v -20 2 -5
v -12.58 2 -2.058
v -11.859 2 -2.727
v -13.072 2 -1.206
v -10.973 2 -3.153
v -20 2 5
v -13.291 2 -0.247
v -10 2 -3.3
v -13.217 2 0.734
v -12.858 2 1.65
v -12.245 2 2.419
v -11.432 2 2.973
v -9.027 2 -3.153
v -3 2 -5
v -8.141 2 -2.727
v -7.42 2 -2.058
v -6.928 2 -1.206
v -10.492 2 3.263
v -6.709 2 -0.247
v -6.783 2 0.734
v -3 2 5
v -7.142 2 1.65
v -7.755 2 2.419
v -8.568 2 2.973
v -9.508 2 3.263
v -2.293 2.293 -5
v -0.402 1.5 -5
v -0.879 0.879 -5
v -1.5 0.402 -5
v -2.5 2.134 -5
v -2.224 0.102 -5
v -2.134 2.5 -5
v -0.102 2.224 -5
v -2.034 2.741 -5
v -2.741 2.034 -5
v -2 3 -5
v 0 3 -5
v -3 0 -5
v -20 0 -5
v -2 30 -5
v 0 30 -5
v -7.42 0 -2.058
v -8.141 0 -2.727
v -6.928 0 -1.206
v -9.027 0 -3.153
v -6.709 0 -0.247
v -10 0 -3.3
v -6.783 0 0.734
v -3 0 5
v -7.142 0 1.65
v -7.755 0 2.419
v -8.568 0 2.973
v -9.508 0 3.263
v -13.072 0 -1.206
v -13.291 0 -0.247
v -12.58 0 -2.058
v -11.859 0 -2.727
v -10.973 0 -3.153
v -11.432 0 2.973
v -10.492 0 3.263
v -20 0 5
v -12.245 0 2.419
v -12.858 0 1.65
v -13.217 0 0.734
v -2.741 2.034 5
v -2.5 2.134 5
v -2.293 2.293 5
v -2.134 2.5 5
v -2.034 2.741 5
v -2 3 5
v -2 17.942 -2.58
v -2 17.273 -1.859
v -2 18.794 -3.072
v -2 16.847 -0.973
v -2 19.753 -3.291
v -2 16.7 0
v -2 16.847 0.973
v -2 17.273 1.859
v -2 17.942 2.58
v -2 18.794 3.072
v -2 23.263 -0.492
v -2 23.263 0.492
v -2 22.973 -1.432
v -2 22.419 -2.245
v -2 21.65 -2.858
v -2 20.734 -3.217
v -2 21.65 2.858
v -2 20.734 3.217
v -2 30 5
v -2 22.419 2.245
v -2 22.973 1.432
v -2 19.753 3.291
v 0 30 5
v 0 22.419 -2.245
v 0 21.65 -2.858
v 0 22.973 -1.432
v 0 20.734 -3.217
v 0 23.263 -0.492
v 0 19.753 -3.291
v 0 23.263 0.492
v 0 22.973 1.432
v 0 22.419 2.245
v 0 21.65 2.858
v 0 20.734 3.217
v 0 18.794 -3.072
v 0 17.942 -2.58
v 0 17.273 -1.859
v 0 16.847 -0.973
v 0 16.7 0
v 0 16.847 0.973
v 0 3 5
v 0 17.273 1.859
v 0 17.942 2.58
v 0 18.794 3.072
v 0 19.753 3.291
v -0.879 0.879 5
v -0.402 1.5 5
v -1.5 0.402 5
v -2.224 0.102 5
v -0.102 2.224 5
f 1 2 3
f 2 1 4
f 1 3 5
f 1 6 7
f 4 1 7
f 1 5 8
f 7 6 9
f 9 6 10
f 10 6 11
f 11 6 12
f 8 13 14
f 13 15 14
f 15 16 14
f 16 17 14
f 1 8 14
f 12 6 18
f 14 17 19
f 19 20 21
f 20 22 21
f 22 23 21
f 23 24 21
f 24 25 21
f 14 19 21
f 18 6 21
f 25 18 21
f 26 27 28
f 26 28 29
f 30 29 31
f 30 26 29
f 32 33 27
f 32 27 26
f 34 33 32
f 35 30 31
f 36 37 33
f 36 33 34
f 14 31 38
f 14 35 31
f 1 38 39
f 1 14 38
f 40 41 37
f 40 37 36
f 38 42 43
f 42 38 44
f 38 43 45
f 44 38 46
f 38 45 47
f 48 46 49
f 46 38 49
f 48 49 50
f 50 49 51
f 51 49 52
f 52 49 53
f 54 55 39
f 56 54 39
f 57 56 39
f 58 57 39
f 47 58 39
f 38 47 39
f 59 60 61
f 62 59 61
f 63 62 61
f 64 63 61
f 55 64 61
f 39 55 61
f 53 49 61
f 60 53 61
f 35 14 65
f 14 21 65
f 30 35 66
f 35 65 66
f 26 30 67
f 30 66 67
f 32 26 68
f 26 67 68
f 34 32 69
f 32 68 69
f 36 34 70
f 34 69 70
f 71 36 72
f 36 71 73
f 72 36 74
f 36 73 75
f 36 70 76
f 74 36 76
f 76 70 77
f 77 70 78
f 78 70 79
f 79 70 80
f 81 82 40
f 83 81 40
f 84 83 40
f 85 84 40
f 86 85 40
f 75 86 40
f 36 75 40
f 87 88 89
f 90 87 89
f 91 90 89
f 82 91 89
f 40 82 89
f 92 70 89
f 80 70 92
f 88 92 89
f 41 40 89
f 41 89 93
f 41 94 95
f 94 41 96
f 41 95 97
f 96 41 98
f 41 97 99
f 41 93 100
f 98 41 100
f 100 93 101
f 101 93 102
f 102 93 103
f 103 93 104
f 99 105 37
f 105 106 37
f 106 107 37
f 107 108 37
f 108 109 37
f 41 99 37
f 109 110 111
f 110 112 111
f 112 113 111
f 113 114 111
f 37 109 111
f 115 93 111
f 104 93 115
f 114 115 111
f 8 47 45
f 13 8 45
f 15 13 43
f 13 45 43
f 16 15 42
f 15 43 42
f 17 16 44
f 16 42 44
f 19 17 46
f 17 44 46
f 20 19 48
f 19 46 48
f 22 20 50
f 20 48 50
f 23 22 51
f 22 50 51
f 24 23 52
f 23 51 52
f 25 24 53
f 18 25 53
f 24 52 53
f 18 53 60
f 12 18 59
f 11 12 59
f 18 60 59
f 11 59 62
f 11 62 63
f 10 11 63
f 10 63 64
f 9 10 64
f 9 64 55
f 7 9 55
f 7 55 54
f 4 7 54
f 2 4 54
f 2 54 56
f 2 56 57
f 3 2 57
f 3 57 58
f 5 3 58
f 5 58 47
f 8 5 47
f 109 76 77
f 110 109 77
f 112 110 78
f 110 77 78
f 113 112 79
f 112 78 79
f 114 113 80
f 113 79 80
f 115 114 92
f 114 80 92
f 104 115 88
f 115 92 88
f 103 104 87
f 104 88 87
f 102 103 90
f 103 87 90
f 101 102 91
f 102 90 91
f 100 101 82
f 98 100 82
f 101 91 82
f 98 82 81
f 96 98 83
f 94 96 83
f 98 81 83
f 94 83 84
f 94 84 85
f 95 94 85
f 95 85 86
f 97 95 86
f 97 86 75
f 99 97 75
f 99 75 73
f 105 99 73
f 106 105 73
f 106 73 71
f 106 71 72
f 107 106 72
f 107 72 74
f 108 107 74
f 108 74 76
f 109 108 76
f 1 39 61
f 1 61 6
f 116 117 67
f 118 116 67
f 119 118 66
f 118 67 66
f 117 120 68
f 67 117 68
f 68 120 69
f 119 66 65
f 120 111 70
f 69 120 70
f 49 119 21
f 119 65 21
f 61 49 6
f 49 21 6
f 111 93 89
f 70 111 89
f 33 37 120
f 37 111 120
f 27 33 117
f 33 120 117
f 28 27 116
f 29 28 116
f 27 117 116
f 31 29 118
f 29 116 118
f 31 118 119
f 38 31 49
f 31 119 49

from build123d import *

# Parameters (mm, degrees)
BRIDA_BASE1_DEPTH                          = 5
TALADRO_DE_MARGEN_PARA_M65_D               = 6.6
TALADRO_DE_MARGEN_PARA_M65_DEPTH           = 11.62
TALADRO_DE_MARGEN_PARA_M65_TIP             = 1.982840043
TALADRO_DE_MARGEN_PARA_M65_ON_FACE_2_D     = 6.6
TALADRO_DE_MARGEN_PARA_M65_ON_FACE_2_DEPTH = 11.62
TALADRO_DE_MARGEN_PARA_M65_ON_FACE_2_TIP   = 1.982840043


# Sheet-metal steps are written as plain solids
with BuildPart() as part:
    # Croquis1 → Brida base1 (new, symmetric)
    with BuildSketch(Plane.XY):
        with BuildLine():
            Line((0, 30), (0, 3))
            ThreePointArc((0, 3), (-0.878679656, 0.878679656), (-3, 0))
            Line((-3, 0), (-20, 0))
            Line((-20, 0), (-20, 2))
            Line((-20, 2), (-3, 2))
            ThreePointArc((-3, 2), (-2.292893219, 2.292893219), (-2, 3))
            Line((-2, 3), (-2, 30))
            Line((-2, 30), (0, 30))
        make_face()
    extrude(amount=BRIDA_BASE1_DEPTH, both=True)

    # Taladro de margen para M65
    with Locations(Plane(origin=(0, 20, 0), x_dir=(0, 1, 0), z_dir=(1, 0, 0))):
        with Locations((0, 0)):
            Hole(TALADRO_DE_MARGEN_PARA_M65_D / 2, depth=TALADRO_DE_MARGEN_PARA_M65_DEPTH)
            with Locations((0, 0, -(TALADRO_DE_MARGEN_PARA_M65_DEPTH + TALADRO_DE_MARGEN_PARA_M65_TIP / 2))):  # 118° drill point
                Cone(0, TALADRO_DE_MARGEN_PARA_M65_D / 2, TALADRO_DE_MARGEN_PARA_M65_TIP, mode=Mode.SUBTRACT)

    # Taladro de margen para M65 on face 2
    with Locations(Plane(origin=(-10, 2, 0), x_dir=(0, 0, 1), z_dir=(0, 1, 0))):
        with Locations((0, 0)):
            Hole(TALADRO_DE_MARGEN_PARA_M65_ON_FACE_2_D / 2, depth=TALADRO_DE_MARGEN_PARA_M65_ON_FACE_2_DEPTH)
            with Locations((0, 0, -(TALADRO_DE_MARGEN_PARA_M65_ON_FACE_2_DEPTH + TALADRO_DE_MARGEN_PARA_M65_ON_FACE_2_TIP / 2))):  # 118° drill point
                Cone(0, TALADRO_DE_MARGEN_PARA_M65_ON_FACE_2_D / 2, TALADRO_DE_MARGEN_PARA_M65_ON_FACE_2_TIP, mode=Mode.SUBTRACT)


solid = part.part
